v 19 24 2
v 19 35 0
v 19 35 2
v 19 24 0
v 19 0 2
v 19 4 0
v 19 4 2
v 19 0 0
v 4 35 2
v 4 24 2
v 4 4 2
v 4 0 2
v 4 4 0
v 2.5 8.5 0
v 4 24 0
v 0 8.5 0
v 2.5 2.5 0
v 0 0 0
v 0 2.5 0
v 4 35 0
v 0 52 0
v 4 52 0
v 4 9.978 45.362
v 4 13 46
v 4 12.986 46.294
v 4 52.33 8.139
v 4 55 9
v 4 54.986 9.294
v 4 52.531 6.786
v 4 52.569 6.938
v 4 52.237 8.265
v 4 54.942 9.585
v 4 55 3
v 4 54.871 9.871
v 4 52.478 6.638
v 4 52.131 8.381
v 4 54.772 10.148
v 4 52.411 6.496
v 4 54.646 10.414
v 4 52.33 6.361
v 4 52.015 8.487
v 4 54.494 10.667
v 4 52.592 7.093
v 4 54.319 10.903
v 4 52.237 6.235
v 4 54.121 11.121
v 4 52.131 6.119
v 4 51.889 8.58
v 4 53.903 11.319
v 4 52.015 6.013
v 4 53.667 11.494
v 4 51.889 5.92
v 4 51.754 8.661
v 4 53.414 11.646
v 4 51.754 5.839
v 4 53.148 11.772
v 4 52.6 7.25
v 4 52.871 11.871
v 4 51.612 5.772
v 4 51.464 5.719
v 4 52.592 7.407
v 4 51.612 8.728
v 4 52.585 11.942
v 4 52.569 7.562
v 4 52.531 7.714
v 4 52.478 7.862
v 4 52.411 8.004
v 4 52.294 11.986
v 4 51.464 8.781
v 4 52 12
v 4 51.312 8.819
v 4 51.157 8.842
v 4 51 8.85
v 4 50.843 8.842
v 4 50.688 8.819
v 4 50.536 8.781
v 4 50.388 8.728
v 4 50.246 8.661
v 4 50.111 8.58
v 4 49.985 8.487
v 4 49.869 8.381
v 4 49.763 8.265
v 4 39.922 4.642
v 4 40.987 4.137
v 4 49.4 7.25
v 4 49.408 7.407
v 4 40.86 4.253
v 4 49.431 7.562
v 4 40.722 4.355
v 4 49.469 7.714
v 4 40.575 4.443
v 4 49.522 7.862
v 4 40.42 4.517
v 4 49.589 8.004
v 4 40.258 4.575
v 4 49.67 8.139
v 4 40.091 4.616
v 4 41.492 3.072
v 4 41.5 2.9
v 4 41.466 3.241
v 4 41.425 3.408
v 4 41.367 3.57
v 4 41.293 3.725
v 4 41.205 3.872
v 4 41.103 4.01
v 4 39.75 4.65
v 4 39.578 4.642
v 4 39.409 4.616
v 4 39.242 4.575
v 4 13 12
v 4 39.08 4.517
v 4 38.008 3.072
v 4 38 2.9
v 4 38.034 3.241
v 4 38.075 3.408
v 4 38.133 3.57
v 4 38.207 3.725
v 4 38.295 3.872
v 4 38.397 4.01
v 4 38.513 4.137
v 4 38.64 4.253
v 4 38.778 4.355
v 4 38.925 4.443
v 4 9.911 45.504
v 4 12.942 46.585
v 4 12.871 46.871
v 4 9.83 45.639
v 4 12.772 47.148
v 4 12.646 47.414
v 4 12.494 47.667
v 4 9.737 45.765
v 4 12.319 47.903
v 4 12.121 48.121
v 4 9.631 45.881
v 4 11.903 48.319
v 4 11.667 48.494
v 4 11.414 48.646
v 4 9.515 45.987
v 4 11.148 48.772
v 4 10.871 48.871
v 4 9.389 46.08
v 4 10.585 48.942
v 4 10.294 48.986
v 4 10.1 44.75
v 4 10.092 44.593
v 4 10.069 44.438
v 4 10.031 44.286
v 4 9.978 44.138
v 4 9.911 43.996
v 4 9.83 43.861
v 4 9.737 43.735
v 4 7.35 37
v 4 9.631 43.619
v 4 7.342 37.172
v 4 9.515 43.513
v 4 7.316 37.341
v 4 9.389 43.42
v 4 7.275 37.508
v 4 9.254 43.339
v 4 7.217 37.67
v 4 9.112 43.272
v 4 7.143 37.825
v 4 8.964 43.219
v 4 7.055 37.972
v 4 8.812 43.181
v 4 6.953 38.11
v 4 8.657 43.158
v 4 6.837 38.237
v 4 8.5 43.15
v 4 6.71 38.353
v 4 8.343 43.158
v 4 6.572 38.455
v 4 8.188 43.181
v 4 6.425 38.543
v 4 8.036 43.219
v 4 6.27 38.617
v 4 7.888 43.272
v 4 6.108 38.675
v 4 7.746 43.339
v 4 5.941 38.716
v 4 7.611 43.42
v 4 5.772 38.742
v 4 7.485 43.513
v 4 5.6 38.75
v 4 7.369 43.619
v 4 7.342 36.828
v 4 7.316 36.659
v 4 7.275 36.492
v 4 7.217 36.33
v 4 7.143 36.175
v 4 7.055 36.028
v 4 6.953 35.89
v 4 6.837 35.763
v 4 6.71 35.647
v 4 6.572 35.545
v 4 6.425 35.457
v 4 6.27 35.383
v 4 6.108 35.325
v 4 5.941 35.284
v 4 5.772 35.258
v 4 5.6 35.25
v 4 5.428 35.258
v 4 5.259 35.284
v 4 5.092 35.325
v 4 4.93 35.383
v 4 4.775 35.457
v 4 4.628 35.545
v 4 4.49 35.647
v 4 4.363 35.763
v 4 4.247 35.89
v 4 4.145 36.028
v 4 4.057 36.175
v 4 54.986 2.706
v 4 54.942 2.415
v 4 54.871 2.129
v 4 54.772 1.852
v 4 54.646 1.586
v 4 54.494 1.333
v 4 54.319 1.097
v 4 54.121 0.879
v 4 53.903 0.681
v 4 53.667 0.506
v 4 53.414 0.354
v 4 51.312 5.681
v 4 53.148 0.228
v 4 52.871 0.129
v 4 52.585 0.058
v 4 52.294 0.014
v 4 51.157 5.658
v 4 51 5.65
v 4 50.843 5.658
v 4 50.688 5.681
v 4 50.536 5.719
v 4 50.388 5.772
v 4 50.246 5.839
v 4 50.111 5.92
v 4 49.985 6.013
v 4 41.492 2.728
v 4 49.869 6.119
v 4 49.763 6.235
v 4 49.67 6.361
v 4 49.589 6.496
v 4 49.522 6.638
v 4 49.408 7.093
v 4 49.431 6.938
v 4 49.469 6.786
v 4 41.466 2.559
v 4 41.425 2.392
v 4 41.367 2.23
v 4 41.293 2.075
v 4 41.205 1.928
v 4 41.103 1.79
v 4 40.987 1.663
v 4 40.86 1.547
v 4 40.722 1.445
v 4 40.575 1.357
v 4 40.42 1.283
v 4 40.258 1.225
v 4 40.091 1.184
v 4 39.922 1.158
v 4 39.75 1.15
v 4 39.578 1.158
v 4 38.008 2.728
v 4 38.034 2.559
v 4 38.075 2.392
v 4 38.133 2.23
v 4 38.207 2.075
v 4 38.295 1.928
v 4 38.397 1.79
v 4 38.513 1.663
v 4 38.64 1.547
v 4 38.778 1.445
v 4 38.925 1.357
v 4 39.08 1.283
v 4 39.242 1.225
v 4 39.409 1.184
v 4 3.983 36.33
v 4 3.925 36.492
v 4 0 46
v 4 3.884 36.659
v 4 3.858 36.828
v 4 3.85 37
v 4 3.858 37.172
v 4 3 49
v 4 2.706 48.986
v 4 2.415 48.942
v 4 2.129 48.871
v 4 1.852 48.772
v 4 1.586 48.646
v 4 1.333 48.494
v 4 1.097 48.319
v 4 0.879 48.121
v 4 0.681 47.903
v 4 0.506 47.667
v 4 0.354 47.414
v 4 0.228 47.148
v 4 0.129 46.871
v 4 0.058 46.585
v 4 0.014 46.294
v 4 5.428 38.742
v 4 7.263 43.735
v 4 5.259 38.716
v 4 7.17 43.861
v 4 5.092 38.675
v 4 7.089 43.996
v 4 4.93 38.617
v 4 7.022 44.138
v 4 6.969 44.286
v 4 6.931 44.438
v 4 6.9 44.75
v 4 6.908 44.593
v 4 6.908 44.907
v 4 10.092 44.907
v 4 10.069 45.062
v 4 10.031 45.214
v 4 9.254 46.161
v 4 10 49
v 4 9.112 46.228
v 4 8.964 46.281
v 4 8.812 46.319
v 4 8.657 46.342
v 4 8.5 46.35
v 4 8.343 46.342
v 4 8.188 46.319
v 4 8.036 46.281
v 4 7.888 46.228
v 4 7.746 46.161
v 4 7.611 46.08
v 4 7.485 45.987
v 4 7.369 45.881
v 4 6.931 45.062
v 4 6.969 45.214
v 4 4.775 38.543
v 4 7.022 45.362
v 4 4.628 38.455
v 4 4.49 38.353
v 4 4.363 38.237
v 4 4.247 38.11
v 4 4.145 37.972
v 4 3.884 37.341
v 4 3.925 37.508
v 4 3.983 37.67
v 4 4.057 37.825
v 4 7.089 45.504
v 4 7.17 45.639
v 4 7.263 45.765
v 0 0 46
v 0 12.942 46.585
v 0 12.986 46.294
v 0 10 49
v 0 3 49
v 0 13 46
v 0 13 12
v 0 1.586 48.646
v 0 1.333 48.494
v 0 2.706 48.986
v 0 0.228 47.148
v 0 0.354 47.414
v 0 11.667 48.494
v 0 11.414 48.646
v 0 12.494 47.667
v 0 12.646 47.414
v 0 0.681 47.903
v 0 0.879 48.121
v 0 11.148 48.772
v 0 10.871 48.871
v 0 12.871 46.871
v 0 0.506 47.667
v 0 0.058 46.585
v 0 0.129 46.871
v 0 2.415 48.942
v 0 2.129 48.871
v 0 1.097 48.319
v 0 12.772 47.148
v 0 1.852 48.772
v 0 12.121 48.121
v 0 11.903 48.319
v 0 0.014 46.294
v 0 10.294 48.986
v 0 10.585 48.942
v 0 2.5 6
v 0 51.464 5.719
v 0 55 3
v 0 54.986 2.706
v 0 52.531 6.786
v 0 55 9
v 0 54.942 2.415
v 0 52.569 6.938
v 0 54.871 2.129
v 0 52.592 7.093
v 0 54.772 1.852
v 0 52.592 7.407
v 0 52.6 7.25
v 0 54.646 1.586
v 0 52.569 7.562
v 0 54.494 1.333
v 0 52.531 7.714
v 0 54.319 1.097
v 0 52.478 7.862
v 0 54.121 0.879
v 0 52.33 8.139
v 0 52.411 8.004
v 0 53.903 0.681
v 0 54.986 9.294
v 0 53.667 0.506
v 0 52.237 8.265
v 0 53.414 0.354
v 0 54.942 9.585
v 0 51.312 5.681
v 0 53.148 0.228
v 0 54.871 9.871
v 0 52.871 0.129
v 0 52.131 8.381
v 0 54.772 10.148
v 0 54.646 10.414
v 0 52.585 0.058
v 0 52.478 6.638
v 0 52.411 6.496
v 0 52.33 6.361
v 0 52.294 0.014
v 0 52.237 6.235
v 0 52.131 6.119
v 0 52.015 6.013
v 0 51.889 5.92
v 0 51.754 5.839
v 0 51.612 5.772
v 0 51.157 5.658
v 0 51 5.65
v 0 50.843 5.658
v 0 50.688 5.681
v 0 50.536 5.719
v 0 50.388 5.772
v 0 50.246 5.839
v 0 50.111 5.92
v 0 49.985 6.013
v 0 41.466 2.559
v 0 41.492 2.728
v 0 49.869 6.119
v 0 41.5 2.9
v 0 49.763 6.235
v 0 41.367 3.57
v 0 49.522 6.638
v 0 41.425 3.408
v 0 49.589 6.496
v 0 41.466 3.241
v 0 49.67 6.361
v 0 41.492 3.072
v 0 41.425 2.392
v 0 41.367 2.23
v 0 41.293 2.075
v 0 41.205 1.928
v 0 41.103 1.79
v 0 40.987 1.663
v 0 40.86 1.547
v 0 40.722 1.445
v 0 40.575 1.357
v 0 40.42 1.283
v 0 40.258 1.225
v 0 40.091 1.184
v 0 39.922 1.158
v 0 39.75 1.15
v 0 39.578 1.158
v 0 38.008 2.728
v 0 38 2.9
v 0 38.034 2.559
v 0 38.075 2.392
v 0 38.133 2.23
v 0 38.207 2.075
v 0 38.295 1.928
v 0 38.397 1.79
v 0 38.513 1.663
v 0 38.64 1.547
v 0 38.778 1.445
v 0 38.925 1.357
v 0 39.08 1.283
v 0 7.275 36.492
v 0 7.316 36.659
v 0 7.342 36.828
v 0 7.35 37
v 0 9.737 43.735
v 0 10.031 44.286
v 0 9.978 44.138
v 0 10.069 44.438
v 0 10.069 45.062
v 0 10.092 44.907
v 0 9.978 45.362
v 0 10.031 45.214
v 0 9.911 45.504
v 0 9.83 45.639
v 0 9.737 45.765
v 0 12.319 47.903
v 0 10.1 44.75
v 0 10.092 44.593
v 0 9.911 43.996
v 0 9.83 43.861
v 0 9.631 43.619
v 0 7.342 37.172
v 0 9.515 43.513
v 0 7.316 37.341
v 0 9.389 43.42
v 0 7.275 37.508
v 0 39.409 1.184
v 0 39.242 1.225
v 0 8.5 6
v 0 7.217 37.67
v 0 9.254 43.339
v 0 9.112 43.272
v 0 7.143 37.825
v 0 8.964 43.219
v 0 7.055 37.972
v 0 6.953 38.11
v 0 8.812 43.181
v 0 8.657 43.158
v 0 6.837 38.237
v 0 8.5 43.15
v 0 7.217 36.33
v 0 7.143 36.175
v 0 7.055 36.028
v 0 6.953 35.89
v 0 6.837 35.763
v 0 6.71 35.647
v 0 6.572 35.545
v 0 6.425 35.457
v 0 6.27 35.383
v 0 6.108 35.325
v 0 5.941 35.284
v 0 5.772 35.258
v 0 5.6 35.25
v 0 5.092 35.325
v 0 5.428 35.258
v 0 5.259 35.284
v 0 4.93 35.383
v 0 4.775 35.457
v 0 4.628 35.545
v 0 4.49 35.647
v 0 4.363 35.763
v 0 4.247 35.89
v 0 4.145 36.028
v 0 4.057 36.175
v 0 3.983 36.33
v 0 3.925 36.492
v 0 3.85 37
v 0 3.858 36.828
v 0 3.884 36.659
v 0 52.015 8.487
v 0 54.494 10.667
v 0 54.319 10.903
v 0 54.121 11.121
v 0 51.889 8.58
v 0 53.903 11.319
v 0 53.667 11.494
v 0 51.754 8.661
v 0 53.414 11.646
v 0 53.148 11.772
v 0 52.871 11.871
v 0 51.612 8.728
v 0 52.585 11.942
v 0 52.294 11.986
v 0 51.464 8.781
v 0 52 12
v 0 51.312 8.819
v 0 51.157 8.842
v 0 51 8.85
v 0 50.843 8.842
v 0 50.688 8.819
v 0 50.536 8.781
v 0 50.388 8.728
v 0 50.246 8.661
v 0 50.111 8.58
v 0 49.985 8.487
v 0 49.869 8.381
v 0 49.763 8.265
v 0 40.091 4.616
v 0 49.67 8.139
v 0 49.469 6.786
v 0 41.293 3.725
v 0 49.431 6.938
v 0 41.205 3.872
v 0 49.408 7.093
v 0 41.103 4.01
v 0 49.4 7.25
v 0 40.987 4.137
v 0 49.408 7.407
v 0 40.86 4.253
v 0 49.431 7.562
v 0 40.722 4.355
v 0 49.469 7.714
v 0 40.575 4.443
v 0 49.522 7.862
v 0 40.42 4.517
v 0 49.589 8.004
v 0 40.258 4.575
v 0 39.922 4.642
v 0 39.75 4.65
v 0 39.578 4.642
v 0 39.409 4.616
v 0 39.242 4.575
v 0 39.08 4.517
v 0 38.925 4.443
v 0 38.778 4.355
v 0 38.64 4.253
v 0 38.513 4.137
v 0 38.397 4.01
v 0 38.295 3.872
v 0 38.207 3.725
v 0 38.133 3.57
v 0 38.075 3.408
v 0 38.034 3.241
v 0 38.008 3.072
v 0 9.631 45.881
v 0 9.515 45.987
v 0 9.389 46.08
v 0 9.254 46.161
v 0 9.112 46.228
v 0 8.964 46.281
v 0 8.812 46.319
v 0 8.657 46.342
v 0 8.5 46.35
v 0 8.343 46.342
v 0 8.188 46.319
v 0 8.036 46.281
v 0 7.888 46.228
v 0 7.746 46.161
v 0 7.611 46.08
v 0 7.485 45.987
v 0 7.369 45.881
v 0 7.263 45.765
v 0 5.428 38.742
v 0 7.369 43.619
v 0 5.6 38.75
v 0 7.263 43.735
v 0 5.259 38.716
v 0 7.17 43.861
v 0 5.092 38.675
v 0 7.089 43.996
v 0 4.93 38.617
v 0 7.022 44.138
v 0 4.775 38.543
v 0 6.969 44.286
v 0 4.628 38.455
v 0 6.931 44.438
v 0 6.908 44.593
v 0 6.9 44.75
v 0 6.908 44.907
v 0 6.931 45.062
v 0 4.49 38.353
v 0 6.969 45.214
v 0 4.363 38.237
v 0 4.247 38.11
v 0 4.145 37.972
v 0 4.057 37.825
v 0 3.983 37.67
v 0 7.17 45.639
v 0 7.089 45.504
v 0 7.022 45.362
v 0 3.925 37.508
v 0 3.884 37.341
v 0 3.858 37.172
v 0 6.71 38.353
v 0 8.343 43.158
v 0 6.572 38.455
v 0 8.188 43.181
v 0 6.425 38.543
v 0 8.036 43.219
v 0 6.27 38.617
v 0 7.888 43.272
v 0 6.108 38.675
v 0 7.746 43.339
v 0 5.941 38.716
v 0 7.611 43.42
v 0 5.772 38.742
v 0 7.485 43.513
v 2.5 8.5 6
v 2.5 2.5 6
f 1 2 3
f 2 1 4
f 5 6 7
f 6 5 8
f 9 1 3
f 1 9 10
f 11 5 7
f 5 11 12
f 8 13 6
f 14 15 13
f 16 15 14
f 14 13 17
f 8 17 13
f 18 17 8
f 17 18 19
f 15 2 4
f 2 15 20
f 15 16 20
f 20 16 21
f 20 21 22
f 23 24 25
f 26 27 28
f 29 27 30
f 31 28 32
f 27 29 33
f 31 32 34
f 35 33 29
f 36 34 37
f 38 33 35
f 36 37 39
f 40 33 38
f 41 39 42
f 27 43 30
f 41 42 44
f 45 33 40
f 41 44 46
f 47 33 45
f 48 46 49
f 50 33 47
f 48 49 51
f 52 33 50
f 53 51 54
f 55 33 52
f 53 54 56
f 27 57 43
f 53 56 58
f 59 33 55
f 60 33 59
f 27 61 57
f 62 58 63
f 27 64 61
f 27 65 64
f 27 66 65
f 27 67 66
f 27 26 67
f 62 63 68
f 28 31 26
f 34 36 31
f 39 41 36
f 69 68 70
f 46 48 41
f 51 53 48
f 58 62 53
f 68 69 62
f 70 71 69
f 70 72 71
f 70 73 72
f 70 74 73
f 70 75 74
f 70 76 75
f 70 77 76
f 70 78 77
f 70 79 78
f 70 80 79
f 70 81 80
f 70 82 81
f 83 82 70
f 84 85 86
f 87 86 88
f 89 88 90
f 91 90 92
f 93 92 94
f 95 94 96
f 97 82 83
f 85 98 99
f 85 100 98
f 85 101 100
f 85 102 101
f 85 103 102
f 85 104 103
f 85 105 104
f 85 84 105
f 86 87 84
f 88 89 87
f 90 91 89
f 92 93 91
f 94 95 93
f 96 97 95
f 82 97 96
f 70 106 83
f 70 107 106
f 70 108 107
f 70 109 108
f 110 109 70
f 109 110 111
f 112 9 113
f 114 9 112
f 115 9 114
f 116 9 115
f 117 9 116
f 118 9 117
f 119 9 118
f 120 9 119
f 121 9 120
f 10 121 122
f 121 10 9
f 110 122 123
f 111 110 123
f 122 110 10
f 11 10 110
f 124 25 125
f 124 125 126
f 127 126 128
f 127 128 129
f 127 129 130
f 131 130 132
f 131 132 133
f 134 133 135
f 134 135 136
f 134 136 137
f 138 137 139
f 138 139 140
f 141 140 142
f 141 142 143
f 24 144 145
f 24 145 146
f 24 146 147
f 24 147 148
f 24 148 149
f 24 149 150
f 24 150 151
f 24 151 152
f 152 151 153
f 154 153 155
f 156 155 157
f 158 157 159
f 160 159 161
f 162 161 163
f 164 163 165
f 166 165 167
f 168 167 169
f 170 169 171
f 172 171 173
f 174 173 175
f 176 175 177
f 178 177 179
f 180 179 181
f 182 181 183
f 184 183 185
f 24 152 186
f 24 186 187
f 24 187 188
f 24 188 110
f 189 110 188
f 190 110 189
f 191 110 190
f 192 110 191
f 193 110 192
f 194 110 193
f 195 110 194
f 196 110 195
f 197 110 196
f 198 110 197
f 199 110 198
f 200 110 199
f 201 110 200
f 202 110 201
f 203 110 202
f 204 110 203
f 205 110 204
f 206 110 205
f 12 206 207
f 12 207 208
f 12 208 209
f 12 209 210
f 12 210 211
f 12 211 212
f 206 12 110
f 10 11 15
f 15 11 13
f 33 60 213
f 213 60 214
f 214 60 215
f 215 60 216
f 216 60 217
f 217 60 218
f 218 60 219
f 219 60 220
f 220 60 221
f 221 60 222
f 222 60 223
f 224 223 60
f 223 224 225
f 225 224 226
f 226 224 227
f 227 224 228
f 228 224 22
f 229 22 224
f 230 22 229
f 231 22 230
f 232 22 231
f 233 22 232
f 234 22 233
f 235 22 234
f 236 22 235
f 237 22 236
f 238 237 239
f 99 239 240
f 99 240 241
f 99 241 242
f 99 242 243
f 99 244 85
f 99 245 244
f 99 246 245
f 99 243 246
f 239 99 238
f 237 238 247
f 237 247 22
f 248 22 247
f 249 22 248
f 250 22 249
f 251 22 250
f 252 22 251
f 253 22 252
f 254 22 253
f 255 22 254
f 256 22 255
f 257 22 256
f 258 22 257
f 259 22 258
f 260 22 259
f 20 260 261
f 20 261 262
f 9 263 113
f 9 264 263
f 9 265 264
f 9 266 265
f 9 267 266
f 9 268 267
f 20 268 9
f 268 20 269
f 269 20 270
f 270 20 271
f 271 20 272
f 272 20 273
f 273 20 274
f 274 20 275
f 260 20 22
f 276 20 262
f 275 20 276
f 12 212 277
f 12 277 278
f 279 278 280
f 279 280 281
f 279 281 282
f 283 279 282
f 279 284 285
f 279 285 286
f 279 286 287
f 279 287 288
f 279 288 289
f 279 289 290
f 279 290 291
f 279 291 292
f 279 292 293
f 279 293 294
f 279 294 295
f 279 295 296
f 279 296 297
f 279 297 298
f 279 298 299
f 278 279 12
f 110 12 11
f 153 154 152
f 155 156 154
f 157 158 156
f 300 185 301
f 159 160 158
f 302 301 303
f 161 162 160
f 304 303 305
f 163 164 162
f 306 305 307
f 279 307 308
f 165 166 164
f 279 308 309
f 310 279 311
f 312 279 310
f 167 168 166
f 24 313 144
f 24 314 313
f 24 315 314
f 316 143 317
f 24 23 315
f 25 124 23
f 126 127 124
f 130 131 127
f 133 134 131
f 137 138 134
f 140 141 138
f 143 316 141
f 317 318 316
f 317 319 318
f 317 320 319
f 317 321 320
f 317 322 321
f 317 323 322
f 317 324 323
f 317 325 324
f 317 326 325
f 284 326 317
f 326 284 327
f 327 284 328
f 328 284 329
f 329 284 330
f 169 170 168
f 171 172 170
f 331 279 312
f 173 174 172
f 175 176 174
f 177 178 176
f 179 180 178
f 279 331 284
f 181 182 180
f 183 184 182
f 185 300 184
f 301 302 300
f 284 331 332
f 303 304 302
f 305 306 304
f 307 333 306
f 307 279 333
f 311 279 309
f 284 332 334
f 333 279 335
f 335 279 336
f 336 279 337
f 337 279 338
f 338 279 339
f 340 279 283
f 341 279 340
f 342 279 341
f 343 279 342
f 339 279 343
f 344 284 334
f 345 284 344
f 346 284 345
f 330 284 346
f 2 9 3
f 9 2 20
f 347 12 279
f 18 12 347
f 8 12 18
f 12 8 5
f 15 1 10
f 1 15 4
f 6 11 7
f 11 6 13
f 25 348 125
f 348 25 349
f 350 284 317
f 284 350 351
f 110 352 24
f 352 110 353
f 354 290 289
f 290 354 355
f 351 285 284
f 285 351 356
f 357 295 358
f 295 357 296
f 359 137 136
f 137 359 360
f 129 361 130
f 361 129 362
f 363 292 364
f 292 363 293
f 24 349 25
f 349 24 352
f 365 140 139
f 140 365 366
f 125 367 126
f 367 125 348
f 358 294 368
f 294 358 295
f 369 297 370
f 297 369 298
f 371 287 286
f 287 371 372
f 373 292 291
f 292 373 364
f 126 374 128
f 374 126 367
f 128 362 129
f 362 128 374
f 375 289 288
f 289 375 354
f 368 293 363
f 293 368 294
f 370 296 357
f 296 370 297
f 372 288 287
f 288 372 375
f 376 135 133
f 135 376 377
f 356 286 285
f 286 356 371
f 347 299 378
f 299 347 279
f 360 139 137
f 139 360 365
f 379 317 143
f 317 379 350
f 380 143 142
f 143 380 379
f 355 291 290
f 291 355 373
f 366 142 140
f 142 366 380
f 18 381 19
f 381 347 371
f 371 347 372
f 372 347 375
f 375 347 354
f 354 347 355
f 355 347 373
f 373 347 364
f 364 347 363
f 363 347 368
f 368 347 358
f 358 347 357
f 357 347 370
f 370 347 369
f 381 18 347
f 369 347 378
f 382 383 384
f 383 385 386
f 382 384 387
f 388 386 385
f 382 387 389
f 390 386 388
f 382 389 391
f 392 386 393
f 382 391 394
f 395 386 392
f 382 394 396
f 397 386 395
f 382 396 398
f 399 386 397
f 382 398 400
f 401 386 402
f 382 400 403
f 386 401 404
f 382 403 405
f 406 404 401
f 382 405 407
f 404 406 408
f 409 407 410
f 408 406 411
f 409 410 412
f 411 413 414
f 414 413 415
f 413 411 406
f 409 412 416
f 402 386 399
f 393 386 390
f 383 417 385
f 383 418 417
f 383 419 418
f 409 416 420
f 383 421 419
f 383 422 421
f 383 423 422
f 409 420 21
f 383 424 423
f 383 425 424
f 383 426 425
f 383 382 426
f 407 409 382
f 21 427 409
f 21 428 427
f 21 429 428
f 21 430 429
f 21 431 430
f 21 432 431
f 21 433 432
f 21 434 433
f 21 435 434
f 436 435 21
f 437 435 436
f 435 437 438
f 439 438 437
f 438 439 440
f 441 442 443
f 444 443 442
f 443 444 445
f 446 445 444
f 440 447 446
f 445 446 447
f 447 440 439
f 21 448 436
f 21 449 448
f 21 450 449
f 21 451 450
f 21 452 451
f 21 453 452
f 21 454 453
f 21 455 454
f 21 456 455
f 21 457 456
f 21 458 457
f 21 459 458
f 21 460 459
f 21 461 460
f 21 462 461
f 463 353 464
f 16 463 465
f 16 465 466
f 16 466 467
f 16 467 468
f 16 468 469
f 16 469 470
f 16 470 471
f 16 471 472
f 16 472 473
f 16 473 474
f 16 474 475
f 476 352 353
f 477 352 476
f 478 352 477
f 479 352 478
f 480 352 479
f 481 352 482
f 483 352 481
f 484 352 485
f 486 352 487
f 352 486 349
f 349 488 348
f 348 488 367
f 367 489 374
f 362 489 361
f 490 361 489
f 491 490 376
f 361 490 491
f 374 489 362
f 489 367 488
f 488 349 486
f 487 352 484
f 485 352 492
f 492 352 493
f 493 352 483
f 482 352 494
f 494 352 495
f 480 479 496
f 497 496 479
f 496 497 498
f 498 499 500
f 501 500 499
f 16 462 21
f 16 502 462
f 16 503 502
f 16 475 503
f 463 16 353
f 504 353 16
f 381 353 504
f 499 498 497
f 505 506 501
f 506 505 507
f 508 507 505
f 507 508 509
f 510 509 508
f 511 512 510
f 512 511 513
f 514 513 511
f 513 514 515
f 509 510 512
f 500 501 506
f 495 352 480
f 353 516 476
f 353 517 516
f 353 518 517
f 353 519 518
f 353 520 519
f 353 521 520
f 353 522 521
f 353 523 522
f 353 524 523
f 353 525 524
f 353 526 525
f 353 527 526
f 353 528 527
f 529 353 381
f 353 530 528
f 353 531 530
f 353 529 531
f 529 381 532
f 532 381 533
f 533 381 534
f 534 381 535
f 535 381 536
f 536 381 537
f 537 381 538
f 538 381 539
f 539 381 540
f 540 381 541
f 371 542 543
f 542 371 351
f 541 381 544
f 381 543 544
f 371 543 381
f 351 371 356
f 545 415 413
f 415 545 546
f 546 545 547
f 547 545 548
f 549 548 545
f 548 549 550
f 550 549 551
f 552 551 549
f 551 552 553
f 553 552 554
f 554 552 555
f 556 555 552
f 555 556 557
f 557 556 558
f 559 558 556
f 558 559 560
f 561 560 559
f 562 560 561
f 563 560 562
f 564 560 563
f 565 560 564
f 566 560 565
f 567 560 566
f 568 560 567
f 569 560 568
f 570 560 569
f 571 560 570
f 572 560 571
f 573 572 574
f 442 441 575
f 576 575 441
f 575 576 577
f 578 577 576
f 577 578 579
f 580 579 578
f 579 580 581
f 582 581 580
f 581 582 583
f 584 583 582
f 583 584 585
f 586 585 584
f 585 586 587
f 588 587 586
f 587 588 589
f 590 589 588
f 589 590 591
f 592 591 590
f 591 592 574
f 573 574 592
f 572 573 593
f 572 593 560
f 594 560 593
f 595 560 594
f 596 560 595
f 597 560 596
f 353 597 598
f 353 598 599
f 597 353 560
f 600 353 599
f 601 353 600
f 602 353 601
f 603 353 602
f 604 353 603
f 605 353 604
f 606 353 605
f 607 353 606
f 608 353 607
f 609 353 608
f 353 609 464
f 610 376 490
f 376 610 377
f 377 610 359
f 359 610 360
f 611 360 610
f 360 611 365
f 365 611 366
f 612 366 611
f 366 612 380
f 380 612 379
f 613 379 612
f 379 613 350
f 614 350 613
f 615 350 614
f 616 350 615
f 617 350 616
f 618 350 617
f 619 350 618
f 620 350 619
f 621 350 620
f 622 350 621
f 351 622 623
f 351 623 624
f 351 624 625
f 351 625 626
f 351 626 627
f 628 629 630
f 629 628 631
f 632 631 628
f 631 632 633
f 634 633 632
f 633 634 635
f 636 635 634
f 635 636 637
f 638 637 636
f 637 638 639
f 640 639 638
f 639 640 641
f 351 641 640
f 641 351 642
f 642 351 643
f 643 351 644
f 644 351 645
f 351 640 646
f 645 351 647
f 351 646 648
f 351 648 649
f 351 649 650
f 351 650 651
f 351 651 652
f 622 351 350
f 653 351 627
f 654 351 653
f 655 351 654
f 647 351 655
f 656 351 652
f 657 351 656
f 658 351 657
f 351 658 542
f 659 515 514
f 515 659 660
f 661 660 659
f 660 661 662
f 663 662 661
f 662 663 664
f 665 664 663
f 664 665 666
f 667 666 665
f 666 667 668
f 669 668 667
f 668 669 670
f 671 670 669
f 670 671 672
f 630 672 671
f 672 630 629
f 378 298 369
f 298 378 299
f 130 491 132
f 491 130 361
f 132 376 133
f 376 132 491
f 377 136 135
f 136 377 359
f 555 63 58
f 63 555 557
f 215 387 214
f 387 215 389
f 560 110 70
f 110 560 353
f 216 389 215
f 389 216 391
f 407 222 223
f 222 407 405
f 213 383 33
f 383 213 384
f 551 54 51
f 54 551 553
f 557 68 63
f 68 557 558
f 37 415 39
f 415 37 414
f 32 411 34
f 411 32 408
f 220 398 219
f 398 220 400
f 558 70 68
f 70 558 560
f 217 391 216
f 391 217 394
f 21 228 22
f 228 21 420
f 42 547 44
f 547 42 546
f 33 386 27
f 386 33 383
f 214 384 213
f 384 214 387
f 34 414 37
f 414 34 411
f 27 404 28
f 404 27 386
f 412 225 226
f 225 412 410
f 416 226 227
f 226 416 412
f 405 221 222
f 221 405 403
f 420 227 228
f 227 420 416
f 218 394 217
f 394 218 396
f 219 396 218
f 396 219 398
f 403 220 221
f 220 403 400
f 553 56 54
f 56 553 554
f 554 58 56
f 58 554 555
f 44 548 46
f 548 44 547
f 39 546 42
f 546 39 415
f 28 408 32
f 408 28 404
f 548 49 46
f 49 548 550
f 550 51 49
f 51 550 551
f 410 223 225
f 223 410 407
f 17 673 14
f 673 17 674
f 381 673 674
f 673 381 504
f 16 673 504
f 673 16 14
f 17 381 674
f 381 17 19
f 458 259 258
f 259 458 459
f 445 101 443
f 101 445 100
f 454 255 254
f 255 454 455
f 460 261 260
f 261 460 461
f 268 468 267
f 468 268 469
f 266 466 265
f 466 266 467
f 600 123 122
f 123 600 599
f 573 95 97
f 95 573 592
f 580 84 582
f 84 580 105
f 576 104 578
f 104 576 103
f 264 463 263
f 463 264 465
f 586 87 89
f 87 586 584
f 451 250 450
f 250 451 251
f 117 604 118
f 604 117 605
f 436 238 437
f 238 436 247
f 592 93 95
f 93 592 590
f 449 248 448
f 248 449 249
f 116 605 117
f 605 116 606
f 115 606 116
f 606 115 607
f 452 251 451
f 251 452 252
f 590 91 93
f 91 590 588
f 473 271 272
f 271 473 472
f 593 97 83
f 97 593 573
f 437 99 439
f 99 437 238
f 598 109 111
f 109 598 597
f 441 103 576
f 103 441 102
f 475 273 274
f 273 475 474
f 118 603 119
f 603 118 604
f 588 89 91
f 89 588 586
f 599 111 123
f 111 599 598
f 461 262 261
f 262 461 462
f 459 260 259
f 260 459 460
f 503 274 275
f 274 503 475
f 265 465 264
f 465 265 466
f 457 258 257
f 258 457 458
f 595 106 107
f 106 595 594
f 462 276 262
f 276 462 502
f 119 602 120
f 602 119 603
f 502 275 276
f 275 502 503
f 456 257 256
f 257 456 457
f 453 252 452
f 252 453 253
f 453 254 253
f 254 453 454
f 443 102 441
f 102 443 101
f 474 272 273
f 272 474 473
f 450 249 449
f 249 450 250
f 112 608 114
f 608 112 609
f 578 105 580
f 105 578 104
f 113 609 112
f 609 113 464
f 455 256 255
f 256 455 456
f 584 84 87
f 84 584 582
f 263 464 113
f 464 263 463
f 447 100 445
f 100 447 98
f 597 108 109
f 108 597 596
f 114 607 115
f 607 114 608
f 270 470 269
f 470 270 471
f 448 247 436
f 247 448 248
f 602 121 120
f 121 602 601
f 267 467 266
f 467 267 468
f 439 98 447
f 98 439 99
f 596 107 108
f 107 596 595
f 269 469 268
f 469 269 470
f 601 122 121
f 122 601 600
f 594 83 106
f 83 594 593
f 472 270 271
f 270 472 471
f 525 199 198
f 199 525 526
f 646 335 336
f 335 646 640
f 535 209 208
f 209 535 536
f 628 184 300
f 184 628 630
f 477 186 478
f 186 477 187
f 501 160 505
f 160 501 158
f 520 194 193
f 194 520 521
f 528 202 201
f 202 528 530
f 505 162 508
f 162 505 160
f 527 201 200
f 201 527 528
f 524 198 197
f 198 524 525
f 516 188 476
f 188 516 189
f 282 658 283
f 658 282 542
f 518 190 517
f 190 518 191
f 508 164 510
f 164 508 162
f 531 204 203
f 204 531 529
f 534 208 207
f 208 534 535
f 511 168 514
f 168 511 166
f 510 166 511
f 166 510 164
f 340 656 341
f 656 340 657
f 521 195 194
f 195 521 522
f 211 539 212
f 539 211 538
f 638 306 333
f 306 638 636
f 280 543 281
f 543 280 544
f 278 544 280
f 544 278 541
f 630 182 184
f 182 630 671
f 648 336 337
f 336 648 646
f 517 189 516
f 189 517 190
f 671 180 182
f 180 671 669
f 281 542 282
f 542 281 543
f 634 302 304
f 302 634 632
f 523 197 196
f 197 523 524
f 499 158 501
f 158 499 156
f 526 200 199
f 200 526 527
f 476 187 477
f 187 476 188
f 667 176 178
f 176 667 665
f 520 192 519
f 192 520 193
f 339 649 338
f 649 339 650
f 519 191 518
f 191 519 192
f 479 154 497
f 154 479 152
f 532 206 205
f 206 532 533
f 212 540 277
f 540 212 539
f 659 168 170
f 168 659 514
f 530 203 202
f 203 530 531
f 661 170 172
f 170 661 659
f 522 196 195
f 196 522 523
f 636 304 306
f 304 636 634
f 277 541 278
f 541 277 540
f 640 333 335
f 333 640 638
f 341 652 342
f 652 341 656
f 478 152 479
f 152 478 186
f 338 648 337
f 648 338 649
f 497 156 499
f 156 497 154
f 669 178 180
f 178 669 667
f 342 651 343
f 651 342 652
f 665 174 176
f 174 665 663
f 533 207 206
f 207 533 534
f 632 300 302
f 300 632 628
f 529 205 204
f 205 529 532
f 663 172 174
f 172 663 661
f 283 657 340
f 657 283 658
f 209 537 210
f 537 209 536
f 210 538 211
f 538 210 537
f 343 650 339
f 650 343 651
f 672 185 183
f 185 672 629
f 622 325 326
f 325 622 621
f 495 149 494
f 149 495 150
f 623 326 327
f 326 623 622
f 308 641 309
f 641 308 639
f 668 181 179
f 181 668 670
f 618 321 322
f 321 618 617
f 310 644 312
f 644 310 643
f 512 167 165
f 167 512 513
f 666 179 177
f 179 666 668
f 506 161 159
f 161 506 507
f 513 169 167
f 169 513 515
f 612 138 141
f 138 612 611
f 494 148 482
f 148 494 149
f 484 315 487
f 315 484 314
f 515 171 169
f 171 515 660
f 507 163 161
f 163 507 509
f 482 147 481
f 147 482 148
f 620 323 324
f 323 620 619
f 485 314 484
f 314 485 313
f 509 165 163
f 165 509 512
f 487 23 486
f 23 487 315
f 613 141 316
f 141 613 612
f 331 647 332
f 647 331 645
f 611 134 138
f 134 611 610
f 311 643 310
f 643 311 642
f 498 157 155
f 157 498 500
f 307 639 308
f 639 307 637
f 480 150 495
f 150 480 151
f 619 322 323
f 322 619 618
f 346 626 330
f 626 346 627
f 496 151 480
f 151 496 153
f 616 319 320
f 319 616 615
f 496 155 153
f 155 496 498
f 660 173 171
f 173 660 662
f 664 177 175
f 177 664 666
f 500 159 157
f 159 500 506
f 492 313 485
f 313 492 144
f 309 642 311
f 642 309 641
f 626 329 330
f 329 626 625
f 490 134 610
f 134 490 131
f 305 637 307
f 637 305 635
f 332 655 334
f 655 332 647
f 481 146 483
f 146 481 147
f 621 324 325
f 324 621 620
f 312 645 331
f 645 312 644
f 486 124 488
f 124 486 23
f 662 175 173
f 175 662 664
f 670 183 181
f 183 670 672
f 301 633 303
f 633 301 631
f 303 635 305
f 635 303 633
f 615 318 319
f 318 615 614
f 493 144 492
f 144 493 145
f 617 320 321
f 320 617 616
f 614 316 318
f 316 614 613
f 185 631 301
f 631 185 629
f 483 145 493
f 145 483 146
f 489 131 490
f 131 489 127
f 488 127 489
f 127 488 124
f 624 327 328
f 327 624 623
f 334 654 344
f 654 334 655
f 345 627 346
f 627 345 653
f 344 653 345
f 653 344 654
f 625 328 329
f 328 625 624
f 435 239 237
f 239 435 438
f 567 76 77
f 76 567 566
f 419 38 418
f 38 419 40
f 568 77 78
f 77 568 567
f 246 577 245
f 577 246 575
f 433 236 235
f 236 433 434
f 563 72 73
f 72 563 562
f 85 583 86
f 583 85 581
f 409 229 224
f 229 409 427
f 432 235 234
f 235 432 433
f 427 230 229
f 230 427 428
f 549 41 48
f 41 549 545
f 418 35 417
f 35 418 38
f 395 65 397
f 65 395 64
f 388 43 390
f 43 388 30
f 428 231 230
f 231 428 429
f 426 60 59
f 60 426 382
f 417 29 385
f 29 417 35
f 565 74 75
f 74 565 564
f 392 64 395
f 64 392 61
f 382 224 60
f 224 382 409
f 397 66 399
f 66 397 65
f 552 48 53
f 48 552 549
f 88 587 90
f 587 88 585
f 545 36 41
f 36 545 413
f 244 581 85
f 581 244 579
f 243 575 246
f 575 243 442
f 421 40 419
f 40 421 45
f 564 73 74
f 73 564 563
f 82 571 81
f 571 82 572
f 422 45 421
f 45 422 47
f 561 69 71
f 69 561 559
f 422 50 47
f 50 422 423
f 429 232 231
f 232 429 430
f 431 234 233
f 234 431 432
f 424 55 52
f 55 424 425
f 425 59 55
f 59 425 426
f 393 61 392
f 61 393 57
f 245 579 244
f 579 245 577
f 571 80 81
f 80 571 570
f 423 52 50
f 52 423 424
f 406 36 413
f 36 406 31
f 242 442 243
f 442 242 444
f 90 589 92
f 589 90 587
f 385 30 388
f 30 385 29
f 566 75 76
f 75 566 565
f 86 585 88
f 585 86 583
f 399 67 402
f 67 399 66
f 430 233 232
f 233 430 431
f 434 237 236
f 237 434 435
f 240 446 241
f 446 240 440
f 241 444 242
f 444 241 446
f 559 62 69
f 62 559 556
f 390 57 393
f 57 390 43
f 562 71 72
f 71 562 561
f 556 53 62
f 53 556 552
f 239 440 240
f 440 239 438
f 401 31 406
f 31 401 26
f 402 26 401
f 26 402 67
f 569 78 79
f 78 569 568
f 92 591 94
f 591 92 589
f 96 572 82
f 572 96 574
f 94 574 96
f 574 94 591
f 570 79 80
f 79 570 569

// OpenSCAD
base();
back();

module base()
{
  hyp = sqrt(pow(11, 2) + pow(11, 2));

  difference() 
  {
    translate([4, 0, 0]) cube(size = [15, 35, 2]);
    translate([4, 4, 0]) cube(size = [15, 20, 5]);
    //translate([31, 45, 0]) rotate([0, 0, 135]) cube(size = [hyp, hyp, 5]);
  }  
}

module back()
{
  difference()
  {
    union()
    {
      translate([4, 0, 0]) rotate([0, -90, 0]) rounded_rectangle([49, 13, 4], [0, 3, 3, 0]); 
      translate([4, 0, 0]) rotate([0, -90, 0]) rounded_rectangle([12, 55, 4], [0, 3, 3, 0]);  
    }
    
    translate([0, 2.5, 0]) cube([2.5, 6, 6]);
    translate([0, 39.75, 2.9]) rotate([0, 90, 0]) cylinder(h = 5, r = 1.75, $fn=64);
    translate([0, 5.6, 37]) rotate([0, 90, 0]) cylinder(h = 5, r = 1.75, $fn=64);
    translate([0, 39.1, 37]) rotate([0, 90, 0]) cylinder(h = 6, r = 3, $fn=64);
    
    //fan screws

    //top
    translate([0, 8.5, 44.75]) rotate([0, 90, 0]) cylinder(h = 5, r = 1.6, $fn=64);
    //bottom
    translate([0, 51, 7.25]) rotate([0, 90, 0]) cylinder(h = 5, r = 1.6, $fn=64);  
  }

}

module rounded_rectangle(size, radius)
{
  x = size[0];
  y = size[1];
  z = size[2];

  tl = radius[0];
  tr = radius[1];
  bl = radius[2];
  br = radius[3];
  
  maximum = max(radius);

  linear_extrude(height=z)
  hull()
  {
    rounded_corner([tl, tl], tl, maximum);
    rounded_corner([x - bl, y - bl], bl, maximum);
    rounded_corner([tr, y - tr], tr, maximum);
    rounded_corner([x - bl, bl], bl, maximum);
  }
}

module rounded_corner(location, radius, maximum)
{
    x = location[0];
    y = location[1];
  
    translate([x, y, 0])
    if(radius == 0)
    {
      square(maximum);
    }
    else
    {
      circle(r = radius, $fn=64);
    }
}
